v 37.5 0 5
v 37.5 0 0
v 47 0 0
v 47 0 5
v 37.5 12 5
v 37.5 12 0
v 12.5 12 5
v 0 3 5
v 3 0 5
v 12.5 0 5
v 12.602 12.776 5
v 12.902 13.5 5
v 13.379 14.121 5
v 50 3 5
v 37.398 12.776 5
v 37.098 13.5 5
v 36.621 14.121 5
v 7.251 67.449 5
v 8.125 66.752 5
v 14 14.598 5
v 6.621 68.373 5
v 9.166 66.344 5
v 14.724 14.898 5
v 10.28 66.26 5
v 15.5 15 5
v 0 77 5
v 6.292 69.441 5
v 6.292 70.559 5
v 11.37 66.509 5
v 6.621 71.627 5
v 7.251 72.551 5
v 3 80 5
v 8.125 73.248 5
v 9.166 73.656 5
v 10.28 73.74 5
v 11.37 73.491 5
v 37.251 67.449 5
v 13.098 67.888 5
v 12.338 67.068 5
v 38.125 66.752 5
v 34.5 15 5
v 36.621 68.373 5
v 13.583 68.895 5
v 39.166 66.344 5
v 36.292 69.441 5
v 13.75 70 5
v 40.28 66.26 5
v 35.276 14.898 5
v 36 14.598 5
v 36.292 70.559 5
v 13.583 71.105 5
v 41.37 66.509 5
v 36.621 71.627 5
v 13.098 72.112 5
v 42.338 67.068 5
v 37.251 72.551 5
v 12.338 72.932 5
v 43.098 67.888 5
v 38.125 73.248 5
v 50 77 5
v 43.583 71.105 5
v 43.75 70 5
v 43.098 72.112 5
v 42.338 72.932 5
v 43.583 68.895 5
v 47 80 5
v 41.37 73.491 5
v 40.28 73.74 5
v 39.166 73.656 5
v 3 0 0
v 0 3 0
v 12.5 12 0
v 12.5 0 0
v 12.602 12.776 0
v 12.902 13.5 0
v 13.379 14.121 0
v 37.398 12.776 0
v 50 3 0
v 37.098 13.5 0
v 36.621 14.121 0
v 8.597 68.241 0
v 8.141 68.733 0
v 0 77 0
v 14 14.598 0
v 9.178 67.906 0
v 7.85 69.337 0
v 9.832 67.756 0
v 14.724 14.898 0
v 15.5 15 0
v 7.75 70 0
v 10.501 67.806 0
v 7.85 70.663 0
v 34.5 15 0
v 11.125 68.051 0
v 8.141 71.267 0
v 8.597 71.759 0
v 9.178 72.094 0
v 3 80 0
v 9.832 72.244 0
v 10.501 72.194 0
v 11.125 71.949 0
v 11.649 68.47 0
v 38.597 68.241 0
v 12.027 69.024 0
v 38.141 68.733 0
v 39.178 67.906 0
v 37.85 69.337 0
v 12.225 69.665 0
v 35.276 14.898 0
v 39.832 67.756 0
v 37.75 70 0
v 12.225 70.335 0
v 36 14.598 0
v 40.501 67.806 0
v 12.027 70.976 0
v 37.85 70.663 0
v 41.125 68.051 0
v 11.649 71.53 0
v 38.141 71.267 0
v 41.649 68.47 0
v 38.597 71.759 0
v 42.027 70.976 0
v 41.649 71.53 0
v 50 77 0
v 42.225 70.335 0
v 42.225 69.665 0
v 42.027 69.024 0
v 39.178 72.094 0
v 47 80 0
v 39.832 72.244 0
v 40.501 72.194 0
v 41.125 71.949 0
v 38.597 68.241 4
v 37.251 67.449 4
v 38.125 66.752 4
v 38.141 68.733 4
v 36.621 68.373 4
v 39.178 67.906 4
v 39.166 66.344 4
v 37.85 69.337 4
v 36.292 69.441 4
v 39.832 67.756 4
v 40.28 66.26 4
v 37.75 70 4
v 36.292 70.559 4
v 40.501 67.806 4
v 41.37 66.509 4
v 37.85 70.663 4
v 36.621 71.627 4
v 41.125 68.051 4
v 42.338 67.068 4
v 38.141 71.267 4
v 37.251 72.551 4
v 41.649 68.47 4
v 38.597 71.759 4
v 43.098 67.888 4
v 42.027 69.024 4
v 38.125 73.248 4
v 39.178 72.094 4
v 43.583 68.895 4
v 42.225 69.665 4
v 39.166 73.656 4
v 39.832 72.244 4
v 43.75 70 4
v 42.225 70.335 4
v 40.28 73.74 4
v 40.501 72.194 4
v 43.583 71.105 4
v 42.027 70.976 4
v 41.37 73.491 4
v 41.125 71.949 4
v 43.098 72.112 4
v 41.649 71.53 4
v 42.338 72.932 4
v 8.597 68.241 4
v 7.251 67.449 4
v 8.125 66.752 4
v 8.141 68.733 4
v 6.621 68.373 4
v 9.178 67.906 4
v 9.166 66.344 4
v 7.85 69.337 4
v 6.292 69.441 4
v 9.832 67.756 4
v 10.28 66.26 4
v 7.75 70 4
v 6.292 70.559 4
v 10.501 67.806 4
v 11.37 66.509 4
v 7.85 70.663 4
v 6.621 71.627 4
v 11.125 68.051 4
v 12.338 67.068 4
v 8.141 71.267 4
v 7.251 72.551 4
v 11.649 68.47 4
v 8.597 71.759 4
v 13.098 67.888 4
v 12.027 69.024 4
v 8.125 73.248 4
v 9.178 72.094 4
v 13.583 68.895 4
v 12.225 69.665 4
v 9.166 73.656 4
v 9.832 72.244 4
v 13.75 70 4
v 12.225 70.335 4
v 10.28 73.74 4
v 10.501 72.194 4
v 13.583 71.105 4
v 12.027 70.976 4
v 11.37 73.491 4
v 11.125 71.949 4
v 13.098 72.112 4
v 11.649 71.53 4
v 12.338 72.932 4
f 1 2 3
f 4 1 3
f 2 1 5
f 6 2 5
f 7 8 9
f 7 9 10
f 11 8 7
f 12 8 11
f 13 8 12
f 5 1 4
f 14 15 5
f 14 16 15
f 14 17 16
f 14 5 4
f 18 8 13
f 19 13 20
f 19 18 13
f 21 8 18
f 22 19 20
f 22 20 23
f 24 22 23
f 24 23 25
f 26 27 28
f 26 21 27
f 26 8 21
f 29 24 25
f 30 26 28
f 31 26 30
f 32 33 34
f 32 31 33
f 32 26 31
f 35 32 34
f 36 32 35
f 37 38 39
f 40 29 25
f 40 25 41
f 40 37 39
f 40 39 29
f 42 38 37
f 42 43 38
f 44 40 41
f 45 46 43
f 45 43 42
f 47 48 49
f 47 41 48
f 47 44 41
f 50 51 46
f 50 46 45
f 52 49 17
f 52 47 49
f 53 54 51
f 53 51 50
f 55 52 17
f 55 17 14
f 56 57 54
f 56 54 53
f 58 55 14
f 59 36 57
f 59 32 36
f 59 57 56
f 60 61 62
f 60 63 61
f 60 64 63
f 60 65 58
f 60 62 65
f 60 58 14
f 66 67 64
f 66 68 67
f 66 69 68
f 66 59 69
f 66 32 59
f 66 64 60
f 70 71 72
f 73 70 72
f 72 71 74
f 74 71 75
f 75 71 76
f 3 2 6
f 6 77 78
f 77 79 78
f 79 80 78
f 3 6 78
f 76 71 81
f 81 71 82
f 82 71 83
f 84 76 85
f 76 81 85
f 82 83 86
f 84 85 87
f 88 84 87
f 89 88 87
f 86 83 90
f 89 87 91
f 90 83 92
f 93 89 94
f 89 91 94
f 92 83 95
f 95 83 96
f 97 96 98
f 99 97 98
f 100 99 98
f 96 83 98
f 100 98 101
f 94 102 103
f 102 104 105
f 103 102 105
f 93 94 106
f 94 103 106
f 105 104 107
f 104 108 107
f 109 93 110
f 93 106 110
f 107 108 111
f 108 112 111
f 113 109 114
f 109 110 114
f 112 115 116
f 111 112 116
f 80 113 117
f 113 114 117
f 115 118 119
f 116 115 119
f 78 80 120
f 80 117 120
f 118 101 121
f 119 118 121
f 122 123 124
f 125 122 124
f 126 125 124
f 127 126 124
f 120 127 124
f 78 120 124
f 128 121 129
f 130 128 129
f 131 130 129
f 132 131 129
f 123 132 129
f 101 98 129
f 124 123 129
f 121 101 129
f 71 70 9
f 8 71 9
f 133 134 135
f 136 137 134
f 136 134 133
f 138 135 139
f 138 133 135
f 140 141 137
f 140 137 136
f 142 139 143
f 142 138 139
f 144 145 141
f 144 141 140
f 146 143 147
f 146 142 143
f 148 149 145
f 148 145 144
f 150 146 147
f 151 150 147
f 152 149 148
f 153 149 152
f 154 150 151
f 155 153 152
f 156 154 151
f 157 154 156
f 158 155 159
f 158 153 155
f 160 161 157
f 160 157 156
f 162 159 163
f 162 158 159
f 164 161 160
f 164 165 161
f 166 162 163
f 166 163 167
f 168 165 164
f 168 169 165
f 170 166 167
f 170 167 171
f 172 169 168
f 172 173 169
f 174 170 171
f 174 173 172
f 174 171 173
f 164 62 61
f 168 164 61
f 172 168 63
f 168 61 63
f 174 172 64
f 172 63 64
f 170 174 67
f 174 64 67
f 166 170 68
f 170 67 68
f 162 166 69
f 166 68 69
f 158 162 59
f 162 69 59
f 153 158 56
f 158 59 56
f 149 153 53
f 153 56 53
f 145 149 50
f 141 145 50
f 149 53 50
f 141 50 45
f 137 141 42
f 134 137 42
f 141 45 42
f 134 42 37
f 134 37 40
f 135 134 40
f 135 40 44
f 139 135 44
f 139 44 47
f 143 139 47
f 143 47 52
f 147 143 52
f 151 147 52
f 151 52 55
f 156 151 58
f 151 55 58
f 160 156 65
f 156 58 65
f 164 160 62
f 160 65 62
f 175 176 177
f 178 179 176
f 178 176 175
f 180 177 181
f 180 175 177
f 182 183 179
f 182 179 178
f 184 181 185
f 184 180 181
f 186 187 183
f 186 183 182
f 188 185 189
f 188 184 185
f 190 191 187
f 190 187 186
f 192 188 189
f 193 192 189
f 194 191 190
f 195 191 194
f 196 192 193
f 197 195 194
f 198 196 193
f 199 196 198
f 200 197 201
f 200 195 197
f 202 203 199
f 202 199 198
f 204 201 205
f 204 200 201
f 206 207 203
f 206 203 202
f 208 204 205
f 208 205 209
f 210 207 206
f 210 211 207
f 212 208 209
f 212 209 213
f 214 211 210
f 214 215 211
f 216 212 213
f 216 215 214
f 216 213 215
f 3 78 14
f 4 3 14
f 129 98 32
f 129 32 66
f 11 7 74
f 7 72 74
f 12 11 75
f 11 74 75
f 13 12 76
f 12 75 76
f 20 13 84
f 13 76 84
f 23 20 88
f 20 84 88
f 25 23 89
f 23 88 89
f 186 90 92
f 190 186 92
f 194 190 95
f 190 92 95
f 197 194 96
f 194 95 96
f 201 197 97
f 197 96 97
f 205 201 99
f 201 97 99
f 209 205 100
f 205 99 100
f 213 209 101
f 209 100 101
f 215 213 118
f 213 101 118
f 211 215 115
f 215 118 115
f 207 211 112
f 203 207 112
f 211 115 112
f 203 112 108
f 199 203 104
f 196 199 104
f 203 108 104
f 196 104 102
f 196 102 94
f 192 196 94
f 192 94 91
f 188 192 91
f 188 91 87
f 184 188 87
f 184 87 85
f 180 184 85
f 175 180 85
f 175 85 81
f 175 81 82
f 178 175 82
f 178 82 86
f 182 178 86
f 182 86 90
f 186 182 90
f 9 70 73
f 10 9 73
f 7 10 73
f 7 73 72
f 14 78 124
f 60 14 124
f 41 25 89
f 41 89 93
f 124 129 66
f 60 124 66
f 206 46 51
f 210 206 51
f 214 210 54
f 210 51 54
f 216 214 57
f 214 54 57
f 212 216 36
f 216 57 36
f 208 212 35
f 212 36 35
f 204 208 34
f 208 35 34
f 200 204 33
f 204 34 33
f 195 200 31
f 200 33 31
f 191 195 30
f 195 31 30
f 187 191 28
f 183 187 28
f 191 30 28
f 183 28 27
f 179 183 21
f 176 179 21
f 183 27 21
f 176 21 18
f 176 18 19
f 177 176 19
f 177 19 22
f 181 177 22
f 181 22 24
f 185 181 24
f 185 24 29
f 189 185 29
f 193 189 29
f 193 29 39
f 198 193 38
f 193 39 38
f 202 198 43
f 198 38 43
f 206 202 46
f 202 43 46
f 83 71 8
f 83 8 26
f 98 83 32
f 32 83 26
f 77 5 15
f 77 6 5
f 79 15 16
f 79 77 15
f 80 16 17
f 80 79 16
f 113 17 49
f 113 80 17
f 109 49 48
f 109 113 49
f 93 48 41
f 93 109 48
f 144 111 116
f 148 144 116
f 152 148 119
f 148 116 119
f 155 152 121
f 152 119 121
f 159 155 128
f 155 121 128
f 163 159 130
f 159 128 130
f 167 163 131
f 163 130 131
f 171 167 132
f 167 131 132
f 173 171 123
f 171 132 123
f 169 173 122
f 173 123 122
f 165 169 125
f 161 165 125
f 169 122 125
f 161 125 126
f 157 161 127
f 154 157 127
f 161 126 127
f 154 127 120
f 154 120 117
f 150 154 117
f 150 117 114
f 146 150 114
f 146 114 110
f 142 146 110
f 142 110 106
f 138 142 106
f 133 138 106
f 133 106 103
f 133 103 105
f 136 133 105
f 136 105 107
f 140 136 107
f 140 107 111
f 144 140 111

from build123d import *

# Parameters (mm, degrees)
F0_W     = 50
F0_H     = 80
F1_DEPTH = 5
F2_W     = 25
F2_H     = 15
F3_DEPTH = 25
F4_R     = 3
F6_SIZE  = 3
F7_D     = 4.5
F7_DEPTH = 12
F5_R     = 3.75
F8_DEPTH = 1


with BuildPart() as f1:
    # F0 (on Top) → F1 (new body)
    with BuildSketch(Plane.XY):
        with Locations((25, 40)):
            Rectangle(F0_W, F0_H)
    extrude(amount=F1_DEPTH)

    # F2 (on face) → F3 (cut)
    with BuildSketch(Plane.XY.offset(5)):
        with Locations((25, 7.5)):
            Rectangle(F2_W, F2_H)
    extrude(amount=-F3_DEPTH, mode=Mode.SUBTRACT)

    # F4
    f4_edges = [f1.edges().sort_by_distance(p)[0] for p in [
        (12.5, 15, 2.5),
        (37.5, 15, 2.5),
    ]]
    fillet(f4_edges, radius=F4_R)

    # F6
    f6_edges = [f1.edges().sort_by_distance(p)[0] for p in [
        (0, 80, 2.5),
        (50, 80, 2.5),
        (0, 0, 2.5),
        (50, 0, 2.5),
    ]]
    chamfer(f6_edges, length=F6_SIZE)

    # F7
    with Locations(Plane.XY.offset(5)):
        with Locations((10, 70), (40, 70)):
            Hole(F7_D / 2, depth=F7_DEPTH)

    # F5 (on face) → F8 (cut)
    with BuildSketch(Plane.XY.offset(5)):
        with Locations((10, 70)):
            Circle(F5_R)
        with Locations((40, 70)):
            Circle(F5_R)
    extrude(amount=-F8_DEPTH, mode=Mode.SUBTRACT)


solid = f1.part
